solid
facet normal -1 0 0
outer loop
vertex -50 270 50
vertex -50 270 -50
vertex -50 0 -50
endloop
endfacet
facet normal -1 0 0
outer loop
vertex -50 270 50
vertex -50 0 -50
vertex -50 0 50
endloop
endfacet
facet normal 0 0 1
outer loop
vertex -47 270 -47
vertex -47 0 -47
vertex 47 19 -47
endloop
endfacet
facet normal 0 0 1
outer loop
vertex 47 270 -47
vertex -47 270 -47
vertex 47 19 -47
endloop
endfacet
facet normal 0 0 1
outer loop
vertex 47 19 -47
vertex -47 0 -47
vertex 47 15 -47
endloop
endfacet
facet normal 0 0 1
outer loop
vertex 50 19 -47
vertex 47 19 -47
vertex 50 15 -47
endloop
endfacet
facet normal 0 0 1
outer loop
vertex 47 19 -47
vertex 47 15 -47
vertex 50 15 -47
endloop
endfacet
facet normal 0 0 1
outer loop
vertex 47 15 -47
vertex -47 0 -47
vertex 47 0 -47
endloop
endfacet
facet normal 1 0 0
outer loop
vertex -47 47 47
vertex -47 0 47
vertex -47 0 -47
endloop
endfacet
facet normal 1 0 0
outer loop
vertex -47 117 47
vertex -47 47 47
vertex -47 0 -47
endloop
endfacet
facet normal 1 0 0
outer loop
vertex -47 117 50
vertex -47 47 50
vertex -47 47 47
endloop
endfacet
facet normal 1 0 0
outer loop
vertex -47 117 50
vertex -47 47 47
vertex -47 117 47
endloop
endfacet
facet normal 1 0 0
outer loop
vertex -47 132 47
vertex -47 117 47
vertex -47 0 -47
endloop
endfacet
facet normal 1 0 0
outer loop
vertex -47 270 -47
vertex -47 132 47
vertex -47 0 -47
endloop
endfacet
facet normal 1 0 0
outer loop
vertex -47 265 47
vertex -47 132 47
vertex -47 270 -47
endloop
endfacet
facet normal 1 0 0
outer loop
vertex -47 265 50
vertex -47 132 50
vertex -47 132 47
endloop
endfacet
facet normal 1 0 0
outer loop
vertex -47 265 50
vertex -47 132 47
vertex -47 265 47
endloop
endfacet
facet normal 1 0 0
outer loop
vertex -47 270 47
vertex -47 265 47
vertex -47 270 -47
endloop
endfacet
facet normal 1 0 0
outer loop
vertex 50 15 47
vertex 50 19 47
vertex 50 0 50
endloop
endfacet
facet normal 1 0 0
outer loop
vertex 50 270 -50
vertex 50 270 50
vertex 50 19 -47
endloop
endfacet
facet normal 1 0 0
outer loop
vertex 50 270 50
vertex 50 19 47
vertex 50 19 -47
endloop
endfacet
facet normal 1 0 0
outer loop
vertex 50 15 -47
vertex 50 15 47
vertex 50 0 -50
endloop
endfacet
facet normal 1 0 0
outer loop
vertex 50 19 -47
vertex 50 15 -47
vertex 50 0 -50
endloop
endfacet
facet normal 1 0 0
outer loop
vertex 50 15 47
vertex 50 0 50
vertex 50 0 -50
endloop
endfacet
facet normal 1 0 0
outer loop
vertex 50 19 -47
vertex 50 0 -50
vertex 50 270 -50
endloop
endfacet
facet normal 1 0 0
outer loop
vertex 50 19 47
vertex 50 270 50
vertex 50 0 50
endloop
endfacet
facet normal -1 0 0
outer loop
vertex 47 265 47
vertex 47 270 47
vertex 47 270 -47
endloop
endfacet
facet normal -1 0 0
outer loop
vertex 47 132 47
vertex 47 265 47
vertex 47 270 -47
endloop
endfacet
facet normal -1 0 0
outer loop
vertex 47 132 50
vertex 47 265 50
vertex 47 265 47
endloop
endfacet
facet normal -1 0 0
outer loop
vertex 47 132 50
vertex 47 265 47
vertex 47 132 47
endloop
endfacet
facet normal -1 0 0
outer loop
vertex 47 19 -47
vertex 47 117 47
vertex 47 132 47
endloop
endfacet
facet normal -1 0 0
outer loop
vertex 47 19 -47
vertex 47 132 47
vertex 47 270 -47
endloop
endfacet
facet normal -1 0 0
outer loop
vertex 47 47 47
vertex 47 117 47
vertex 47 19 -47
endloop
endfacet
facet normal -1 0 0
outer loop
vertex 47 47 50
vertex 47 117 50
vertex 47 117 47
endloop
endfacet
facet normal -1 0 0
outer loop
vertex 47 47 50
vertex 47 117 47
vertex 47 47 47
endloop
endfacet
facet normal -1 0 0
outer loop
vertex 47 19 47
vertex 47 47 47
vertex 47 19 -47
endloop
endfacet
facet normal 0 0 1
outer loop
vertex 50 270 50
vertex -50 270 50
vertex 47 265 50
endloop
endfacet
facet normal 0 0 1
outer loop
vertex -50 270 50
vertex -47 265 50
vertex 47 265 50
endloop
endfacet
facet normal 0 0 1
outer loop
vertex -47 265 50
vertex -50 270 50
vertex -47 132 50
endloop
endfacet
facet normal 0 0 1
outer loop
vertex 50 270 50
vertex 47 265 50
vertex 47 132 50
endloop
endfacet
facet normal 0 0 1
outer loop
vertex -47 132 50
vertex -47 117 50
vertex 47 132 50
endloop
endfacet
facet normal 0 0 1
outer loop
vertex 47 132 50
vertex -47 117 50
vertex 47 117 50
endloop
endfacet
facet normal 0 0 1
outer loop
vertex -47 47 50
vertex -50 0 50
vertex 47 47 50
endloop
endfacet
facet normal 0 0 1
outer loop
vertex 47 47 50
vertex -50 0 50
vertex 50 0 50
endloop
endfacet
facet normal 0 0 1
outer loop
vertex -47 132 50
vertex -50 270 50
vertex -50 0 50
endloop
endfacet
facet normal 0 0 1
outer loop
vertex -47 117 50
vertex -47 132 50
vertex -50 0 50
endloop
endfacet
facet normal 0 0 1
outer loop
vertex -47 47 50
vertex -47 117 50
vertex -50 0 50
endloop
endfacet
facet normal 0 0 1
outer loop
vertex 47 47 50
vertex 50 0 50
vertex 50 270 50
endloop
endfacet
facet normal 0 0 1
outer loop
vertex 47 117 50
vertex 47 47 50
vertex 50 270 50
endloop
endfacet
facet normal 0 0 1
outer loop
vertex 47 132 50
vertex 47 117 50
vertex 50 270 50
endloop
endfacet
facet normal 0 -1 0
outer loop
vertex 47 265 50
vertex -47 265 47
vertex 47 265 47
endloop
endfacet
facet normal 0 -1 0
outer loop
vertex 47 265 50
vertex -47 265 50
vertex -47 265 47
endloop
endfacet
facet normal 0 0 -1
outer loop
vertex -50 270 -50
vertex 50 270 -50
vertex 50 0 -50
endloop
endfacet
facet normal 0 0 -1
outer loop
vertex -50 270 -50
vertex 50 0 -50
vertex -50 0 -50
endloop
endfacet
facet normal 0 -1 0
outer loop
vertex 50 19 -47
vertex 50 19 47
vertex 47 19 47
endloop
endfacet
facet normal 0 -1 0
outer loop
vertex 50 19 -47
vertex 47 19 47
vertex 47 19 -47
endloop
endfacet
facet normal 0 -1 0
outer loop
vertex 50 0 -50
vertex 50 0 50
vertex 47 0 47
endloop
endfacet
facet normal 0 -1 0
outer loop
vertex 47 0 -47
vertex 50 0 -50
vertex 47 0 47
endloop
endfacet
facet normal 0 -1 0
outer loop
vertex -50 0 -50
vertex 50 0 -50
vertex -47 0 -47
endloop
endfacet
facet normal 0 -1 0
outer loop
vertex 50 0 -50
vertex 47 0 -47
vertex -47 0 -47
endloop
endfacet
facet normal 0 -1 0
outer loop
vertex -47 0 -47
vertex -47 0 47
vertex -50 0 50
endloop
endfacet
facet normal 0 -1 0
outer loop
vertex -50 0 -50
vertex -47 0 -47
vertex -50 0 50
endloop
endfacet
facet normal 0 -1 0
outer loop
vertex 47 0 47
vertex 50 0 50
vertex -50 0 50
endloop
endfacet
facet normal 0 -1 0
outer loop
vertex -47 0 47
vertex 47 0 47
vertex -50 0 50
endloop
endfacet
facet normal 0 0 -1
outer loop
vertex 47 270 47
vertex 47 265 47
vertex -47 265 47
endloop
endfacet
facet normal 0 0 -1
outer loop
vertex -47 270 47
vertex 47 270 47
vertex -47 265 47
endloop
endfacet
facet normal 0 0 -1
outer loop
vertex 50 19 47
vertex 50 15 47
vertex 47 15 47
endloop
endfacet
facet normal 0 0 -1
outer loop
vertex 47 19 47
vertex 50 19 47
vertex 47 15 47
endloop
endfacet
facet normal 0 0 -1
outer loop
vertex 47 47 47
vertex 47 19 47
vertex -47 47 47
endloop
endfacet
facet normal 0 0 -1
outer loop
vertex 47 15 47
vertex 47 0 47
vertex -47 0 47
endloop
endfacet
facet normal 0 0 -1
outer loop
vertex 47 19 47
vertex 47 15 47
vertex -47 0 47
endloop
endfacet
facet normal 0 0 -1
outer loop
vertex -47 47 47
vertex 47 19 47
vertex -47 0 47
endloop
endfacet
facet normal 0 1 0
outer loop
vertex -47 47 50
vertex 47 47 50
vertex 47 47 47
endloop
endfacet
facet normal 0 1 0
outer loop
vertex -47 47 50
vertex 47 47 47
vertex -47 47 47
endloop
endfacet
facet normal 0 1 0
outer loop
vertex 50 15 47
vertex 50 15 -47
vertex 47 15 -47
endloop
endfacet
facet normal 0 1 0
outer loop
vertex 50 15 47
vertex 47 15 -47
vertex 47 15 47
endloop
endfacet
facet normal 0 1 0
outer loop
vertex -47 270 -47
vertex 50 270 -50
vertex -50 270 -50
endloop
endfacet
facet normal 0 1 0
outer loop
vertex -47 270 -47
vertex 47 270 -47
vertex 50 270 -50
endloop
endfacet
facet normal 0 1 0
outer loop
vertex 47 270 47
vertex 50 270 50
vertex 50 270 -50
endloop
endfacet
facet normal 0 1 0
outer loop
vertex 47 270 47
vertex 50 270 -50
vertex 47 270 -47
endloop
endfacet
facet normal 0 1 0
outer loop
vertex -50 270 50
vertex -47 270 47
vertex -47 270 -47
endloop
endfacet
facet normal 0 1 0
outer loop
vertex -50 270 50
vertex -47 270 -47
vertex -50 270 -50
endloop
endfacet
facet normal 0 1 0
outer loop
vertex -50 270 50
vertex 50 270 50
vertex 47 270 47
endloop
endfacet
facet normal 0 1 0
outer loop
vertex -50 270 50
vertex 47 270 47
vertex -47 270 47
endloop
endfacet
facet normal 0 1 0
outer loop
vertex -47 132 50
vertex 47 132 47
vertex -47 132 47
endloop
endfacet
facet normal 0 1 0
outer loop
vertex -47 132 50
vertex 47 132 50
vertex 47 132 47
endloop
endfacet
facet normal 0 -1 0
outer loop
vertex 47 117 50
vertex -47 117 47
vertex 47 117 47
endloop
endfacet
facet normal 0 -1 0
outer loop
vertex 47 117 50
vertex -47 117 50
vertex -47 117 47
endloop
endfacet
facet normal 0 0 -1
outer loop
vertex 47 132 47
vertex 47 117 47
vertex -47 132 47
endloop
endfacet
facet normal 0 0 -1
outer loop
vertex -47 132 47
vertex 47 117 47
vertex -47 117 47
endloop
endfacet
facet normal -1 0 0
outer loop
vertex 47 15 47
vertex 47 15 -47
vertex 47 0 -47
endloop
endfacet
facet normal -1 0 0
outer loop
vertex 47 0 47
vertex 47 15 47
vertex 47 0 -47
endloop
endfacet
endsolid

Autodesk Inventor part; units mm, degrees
ref_plane "YZ Plane" through (0, 0, 0) normal (1, 0, 0) x (0, 1, 0)
ref_plane "XZ Plane" through (0, 0, 0) normal (0, 1, 0) x (-1, 0, 0)
ref_plane "XY Plane" through (0, 0, 0) normal (0, 0, 1) x (1, 0, 0)
sketch "Sketch1" plane through (0, 0, 0) normal (0, 1, 0) x (-1, 0, 0)
  line L0 (50, 50) -> (-50, 50)
  line L1 (-50, 50) -> (-50, -50)
  line L2 (-50, -50) -> (50, -50)
  line L3 (50, -50) -> (50, 50)
  line L4 (50, 50) -> (-50, -50) construction
  line L5 (-50, 50) -> (50, -50) construction
  line L6 (-47, 47) -> (47, 47)
  line L7 (47, 47) -> (47, -47)
  line L8 (47, -47) -> (-47, -47)
  line L9 (-47, -47) -> (-47, 47)
  line L10 (-47, 47) -> (47, -47) construction
  line L11 (47, 47) -> (-47, -47) construction
  point P0 (0, 0)
  dimension "d0" = 100
  dimension "d1" = 100
  dimension "d2" = 3
  dimension "d3" = 3
extrude "Extrusion1" add sketch "Sketch1" along normal blind 270
sketch "Sketch2" plane through (-50, 0, 50) normal (0, 0, 1) x (1, 0, 0)
  line L0 (3, 265) -> (97, 265)
  line L1 (97, 265) -> (97, 132)
  line L2 (97, 132) -> (3, 132)
  line L3 (3, 132) -> (3, 265)
  line L4 (0, 0) -> (0, 270) projected
  line L5 (0, 270) -> (100, 270) projected
  line L6 (3, 117) -> (97, 117)
  line L7 (97, 117) -> (97, 47)
  line L8 (97, 47) -> (3, 47)
  line L9 (3, 47) -> (3, 117)
  line L10 (100, 0) -> (100, 270) projected
  point P0 (50, 0)
  point P1 (50, 270)
  point P2 (50, 265)
  dimension "d6" = 94
  dimension "d7" = 3
  dimension "d8" = 5
  dimension "d9" = 133
  dimension "d10" = 70
  dimension "d11" = 15
  dimension "d12" = 3
extrude "Extrusion2" cut sketch "Sketch2" against normal blind 10
sketch "Sketch10" plane through (50, 0, 50) normal (1, 0, 0) x (0, 0, -1)
  line L0 (3, 0) -> (3, 47) projected
  line L1 (97, 0) -> (97, 270) projected
  line L2 (3, 19) -> (97, 19)
  line L3 (97, 19) -> (97, 15)
  line L4 (97, 15) -> (3, 15)
  line L5 (3, 15) -> (3, 19)
  line L6 (0, 0) -> (100, 0) projected
  point P0 (50, 0)
  point P1 (3, 15)
  dimension "d46" = 4
  dimension "d49" = 15
extrude "Extrusion10" cut sketch "Sketch10" against normal blind 10 contours L0 L2 L1 L4
equation "\"d1\" = d0"
equation "\"d12\" = d7"
properties part number "FLU-ShaftRS3" material "Steel"
